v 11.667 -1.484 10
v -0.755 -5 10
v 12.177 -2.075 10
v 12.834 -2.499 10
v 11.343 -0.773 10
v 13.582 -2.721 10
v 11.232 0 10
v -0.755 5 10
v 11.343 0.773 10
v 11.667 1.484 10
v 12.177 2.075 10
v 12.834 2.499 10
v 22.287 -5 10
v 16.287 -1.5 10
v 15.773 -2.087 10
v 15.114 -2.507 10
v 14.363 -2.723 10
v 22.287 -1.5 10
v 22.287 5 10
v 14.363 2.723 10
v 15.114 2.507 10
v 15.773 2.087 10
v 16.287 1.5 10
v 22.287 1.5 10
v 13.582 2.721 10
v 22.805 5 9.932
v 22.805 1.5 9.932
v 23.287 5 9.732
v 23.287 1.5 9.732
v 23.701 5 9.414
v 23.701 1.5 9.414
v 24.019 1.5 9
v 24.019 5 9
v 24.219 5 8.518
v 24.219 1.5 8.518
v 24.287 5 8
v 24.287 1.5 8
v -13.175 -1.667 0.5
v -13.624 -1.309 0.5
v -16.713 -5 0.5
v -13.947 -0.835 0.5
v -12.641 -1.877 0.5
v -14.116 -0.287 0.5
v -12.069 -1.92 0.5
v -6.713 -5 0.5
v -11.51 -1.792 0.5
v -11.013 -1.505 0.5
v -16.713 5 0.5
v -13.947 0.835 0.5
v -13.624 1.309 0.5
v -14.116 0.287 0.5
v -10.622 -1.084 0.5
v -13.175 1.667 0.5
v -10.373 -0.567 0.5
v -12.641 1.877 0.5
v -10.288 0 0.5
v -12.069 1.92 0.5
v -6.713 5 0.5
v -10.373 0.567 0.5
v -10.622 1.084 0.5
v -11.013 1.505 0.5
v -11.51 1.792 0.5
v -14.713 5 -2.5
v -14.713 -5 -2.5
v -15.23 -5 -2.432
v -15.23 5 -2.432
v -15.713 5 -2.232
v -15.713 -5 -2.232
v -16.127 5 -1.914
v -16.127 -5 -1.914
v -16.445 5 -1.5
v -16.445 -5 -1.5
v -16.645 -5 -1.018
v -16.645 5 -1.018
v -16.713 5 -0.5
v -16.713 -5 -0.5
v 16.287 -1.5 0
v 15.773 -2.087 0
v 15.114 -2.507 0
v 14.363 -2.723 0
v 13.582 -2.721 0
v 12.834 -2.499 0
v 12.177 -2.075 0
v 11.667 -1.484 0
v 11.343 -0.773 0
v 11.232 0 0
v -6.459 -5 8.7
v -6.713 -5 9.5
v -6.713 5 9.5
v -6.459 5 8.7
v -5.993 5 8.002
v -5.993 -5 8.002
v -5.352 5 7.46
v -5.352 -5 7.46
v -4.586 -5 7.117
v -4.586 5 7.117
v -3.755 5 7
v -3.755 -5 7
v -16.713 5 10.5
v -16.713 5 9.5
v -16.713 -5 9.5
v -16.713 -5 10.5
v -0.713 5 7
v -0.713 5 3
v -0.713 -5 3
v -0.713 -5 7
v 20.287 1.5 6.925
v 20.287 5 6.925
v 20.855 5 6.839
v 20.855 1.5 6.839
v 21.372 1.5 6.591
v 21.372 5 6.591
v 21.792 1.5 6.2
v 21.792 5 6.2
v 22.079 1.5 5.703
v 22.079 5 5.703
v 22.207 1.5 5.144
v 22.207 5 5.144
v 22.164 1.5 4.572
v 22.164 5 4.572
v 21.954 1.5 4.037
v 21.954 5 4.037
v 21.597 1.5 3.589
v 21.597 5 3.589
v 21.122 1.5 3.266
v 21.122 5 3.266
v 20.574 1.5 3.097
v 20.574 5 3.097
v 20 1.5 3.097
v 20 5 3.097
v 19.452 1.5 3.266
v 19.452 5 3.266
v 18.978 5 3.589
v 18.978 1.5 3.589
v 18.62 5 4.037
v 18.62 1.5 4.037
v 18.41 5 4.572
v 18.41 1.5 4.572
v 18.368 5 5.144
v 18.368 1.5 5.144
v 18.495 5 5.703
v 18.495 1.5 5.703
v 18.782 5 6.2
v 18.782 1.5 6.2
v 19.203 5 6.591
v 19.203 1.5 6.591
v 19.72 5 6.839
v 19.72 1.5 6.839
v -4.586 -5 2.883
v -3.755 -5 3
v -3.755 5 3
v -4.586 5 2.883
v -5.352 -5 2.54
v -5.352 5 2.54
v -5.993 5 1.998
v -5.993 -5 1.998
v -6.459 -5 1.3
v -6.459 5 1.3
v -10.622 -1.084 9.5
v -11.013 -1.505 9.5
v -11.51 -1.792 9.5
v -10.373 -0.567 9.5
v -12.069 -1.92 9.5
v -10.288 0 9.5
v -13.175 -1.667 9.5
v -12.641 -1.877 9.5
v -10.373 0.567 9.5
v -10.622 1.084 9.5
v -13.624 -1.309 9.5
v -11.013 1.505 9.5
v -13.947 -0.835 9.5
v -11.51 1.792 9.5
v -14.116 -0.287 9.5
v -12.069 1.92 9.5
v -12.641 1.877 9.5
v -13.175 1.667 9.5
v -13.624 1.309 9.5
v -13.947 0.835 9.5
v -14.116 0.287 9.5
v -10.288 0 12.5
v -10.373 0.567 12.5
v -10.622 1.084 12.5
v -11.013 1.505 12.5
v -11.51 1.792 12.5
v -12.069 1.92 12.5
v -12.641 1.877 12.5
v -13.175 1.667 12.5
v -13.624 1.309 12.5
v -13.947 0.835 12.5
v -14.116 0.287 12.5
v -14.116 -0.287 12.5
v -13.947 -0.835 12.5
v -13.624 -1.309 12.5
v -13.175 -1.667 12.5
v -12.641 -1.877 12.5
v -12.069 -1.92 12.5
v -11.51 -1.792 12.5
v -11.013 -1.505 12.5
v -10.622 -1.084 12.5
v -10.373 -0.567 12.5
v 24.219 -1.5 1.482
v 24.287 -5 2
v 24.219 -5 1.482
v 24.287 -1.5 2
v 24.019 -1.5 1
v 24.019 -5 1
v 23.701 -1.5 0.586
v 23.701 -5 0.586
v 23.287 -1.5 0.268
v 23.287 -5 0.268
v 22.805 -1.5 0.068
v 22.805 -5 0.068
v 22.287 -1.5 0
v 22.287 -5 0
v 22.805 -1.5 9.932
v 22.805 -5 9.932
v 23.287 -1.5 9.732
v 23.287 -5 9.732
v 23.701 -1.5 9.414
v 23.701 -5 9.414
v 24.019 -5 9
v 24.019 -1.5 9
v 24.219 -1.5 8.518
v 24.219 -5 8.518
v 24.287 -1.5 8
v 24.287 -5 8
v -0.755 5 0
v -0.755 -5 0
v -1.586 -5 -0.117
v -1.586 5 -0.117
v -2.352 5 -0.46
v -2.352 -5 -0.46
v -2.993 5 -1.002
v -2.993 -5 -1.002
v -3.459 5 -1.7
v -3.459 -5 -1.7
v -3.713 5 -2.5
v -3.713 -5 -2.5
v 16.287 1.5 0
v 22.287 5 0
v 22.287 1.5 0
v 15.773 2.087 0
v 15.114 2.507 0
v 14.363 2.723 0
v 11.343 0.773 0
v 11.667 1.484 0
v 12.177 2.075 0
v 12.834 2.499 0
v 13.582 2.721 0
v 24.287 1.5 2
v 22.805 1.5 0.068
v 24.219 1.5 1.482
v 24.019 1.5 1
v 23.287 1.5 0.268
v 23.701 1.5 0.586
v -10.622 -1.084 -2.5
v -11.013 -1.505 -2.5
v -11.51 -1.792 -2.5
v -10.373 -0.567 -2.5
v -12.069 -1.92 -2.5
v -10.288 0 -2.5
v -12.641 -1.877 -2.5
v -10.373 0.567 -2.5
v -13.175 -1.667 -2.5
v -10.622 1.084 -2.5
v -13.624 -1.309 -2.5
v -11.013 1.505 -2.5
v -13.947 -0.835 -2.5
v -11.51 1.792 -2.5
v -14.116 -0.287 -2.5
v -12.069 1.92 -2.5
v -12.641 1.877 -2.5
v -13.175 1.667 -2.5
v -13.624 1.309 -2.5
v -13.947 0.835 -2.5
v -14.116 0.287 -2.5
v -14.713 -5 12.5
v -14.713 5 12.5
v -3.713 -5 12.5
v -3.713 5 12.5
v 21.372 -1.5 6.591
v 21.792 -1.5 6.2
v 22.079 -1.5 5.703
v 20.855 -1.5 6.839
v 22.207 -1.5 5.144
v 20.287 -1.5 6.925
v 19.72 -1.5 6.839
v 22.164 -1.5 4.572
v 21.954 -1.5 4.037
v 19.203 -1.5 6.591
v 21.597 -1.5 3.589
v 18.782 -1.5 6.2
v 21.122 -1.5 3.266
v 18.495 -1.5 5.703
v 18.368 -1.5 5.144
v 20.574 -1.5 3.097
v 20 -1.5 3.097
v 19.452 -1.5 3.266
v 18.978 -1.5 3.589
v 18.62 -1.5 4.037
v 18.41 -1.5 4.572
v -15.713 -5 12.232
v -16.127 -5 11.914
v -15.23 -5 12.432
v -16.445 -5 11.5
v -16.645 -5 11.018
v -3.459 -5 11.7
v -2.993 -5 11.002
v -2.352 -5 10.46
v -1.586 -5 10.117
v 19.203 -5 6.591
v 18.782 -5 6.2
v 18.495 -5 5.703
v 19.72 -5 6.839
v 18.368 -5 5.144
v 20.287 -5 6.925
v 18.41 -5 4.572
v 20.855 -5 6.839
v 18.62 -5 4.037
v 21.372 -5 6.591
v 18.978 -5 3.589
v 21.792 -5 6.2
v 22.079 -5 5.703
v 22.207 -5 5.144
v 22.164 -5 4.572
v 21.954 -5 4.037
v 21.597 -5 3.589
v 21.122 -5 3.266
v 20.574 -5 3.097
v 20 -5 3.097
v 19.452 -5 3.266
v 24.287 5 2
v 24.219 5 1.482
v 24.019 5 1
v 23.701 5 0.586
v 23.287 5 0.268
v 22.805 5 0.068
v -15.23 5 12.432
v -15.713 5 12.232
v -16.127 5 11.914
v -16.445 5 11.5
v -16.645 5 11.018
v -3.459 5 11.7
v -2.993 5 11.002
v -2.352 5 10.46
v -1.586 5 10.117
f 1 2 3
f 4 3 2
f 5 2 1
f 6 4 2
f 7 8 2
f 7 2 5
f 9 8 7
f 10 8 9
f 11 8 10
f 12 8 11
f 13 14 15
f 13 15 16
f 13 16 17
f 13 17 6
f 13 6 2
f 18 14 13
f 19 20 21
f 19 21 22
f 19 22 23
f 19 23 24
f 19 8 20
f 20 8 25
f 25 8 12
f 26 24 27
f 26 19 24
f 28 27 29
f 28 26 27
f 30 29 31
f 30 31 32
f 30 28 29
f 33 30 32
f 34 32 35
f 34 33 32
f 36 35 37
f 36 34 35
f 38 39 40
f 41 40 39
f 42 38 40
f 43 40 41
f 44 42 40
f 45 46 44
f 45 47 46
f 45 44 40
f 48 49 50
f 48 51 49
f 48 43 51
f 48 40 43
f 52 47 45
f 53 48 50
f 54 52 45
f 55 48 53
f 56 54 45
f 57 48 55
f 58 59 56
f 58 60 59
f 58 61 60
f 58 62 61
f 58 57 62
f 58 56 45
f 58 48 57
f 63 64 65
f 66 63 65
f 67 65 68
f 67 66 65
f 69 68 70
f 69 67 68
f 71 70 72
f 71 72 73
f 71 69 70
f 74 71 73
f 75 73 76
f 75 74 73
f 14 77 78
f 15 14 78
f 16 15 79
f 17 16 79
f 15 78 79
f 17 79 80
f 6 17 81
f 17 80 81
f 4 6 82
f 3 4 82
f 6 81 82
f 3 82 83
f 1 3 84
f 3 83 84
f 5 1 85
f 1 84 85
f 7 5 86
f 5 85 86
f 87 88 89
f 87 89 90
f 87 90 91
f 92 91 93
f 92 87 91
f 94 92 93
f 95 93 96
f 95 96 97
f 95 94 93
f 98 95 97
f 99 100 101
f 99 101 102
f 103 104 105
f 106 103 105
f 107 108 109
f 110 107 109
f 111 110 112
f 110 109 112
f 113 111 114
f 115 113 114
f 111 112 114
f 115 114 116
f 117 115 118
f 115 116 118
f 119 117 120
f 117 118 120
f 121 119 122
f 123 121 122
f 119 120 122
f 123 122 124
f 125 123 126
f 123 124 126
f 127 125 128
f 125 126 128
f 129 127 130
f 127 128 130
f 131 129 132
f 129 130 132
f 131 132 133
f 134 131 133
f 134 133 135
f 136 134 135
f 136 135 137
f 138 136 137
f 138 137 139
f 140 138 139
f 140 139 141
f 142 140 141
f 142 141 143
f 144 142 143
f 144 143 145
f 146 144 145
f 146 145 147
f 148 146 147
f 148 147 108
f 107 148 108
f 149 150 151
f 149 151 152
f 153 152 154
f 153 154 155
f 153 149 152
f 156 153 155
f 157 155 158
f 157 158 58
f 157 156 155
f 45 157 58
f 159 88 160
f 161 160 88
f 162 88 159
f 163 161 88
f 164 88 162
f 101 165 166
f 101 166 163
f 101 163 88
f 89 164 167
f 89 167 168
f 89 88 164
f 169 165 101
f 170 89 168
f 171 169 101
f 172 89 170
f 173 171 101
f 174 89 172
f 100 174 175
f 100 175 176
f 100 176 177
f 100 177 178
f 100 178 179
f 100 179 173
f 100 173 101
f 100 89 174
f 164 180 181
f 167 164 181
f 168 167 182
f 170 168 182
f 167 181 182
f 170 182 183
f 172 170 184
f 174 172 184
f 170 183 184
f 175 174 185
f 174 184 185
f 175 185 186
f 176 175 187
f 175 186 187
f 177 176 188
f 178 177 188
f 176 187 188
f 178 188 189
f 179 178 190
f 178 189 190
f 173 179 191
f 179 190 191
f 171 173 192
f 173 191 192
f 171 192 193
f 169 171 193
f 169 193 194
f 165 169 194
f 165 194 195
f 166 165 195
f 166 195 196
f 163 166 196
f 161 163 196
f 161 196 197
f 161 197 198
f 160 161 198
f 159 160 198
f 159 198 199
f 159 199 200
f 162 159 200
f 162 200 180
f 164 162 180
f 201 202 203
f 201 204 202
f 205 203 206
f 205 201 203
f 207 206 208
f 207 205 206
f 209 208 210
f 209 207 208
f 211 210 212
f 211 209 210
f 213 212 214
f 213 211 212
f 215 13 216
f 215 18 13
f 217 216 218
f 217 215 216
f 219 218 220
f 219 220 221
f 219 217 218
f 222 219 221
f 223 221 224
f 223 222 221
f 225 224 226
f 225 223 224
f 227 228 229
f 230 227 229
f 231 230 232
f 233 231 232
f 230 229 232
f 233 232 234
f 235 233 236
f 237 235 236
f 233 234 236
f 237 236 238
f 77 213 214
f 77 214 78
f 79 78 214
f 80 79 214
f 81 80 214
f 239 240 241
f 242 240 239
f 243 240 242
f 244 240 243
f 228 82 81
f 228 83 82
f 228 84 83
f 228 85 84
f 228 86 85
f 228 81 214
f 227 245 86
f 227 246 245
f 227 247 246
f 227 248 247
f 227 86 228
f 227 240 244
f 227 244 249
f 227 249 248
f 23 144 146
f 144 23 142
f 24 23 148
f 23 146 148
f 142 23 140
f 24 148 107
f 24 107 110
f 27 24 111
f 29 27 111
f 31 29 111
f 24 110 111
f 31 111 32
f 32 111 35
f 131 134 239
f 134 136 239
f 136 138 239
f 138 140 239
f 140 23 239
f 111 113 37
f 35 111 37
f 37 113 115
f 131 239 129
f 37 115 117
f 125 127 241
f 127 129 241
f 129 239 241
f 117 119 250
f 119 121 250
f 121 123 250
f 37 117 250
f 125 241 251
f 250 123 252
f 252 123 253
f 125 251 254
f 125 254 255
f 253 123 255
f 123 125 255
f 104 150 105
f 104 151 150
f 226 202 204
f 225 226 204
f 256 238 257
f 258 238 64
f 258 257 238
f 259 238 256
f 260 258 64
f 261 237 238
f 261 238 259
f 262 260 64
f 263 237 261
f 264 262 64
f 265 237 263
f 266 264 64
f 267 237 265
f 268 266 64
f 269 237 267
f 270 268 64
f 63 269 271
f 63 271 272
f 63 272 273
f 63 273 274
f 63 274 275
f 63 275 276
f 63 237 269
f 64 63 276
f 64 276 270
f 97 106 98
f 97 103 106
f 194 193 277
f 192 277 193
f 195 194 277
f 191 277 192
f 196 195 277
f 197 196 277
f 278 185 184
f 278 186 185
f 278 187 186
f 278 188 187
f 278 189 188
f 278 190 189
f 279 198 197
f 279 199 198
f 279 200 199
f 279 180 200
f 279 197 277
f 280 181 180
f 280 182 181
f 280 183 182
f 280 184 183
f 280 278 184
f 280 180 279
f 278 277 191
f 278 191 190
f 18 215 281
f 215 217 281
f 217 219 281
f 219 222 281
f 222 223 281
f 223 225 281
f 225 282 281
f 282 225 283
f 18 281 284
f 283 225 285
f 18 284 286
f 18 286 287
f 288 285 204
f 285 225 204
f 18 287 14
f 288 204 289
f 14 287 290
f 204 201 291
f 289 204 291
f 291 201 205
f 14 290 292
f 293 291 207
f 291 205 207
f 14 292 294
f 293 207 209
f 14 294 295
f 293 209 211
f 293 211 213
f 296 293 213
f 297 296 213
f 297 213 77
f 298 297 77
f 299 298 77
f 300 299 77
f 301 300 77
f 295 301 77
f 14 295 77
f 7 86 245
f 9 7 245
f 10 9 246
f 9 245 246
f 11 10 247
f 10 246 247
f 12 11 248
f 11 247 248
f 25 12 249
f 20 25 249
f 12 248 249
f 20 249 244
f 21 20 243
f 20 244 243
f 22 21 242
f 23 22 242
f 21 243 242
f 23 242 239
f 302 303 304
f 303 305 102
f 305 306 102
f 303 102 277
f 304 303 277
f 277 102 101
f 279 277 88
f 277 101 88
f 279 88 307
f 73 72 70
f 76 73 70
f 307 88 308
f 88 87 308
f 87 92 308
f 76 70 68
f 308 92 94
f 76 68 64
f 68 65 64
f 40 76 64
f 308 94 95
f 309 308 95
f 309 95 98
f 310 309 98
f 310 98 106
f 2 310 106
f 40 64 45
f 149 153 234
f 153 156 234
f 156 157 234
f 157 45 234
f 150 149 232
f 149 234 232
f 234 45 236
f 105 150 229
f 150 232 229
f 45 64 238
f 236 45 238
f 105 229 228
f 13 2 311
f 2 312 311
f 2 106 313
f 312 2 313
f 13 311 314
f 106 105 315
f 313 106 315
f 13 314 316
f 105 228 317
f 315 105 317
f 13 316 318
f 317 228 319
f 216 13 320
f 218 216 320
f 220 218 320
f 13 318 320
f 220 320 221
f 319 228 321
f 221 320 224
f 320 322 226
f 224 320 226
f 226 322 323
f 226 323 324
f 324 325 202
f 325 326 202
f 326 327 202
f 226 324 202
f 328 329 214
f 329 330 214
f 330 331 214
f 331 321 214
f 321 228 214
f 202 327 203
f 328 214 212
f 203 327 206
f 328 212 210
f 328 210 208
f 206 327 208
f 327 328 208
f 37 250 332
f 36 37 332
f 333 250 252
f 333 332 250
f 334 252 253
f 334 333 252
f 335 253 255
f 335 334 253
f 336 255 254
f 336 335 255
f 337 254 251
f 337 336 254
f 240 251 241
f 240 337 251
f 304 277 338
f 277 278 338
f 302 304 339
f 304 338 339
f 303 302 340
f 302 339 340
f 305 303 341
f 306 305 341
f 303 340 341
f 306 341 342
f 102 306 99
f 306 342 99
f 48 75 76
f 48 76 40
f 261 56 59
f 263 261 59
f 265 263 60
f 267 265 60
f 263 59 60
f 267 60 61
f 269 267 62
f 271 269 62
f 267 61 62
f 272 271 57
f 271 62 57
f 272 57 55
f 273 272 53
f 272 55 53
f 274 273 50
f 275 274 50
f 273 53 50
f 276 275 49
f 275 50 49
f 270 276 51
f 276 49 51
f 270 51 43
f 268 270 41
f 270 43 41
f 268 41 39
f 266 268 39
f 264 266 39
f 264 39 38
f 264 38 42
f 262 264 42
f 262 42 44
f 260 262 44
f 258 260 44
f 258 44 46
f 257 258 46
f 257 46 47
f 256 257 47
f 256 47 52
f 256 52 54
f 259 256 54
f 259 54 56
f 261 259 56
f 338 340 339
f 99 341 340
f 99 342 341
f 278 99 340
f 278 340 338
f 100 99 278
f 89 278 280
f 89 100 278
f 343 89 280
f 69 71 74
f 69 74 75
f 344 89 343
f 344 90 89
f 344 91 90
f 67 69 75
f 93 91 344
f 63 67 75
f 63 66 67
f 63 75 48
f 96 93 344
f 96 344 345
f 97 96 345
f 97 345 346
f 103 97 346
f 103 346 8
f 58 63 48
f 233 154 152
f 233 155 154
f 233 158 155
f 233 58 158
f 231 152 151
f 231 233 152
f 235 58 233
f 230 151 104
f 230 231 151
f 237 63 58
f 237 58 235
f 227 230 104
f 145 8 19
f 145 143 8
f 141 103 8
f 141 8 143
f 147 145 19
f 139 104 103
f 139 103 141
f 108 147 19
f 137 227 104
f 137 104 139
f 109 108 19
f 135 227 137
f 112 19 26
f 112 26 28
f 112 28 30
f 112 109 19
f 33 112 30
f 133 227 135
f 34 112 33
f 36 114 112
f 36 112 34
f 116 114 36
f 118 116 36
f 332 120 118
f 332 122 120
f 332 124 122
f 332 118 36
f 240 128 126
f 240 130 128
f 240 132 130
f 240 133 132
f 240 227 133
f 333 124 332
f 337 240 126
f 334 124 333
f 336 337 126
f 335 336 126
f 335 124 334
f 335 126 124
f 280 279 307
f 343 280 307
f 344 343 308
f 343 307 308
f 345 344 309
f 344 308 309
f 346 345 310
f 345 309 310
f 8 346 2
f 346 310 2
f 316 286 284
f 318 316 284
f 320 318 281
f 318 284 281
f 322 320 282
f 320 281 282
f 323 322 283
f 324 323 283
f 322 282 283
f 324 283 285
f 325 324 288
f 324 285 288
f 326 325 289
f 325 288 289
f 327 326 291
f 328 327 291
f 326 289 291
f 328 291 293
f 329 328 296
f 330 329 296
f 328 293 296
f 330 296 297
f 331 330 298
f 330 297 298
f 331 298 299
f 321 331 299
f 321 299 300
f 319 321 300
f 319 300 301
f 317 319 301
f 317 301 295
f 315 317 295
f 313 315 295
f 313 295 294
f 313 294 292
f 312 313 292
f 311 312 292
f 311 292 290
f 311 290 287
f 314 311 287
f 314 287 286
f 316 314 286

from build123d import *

# Parameters (mm, degrees)
BOSS_EXTRUDE1_DEPTH             = 10
SKETCH2_R                       = 1.925
CUT_EXTRUDE1_DEPTH              = 29.104589728
BOSS_EXTRUDE2_REACH             = 28.737
BOSS_EXTRUDE2_DIRECTION_2_REACH = 28.737
SKETCH4_R                       = 1.925
CUT_EXTRUDE2_DEPTH              = 29.980475562
FILLET1_START                   = -6
FILLET1_DEPTH                   = 12
FILLET1_START_2                 = -5
FILLET1_2_DEPTH                 = 10
FILLET2_R                       = 2


with BuildPart() as part:
    # Sketch1 → Boss-Extrude1 (new body)
    with BuildSketch(Plane.XY):
        with BuildLine():
            Line((-0.712802471, 5), (-0.712802471, 0))
            Line((-0.712802471, 0), (11.232311414, 0))
            ThreePointArc((11.232311414, 0), (13.199986934, 2.636374102), (16.287197529, 1.5))
            Line((16.287197529, 1.5), (24.287197529, 1.5))
            Line((24.287197529, 1.5), (24.287197529, 5))
            Line((24.287197529, 5), (-0.712802471, 5))
        make_face()
        with BuildLine():
            Line((11.232311414, 0), (-0.712802471, 0))
            Line((-0.712802471, 0), (-0.712802471, -5))
            Line((-0.712802471, -5), (24.287197529, -5))
            Line((24.287197529, -5), (24.287197529, -1.5))
            Line((24.287197529, -1.5), (16.287197529, -1.5))
            ThreePointArc((16.287197529, -1.5), (13.199986934, -2.636374102), (11.232311414, 0))
        make_face()
    extrude(amount=BOSS_EXTRUDE1_DEPTH)

    # Sketch2 → Cut-Extrude1 (cut, through all)
    with BuildSketch(Plane(origin=(0, 5, 0), x_dir=(1, 0, 0), z_dir=(0, 1, 0))):
        with Locations(Location((20.287197529, -5, 0), (0, 0, 270))):
            Circle(SKETCH2_R)
    extrude(amount=-CUT_EXTRUDE1_DEPTH, mode=Mode.SUBTRACT)

    # Boss-Extrude2: up to this face of the body (flat: up to its plane)
    boss_extrude2_end = Plane(part.part.faces().sort_by_distance((11.372052598, 5, 5))[0])
    # Sketch3 → Boss-Extrude2 (add, up to the picked face)
    with BuildSketch(Plane(origin=(0, 0, 0), x_dir=(1, 0, 0), z_dir=(0, 1, 0)), mode=Mode.PRIVATE) as boss_extrude2_sk1:
        Polygon((-0.712802471, 0), (-3.712802471, 0), (-3.712802471, 2.5), (-16.712802471, 2.5), (-16.712802471, -0.5), (-6.712802471, -0.5), (-6.712802471, -3), (-0.712802471, -3), align=None)
    boss_extrude2_tool1 = split(extrude(boss_extrude2_sk1.sketch, amount=BOSS_EXTRUDE2_REACH, mode=Mode.PRIVATE), bisect_by=boss_extrude2_end, keep=Keep.BOTH, mode=Mode.PRIVATE)
    # Sketch3 → Boss-Extrude2 (add, up to the picked face)
    with BuildSketch(Plane(origin=(0, 0, 0), x_dir=(1, 0, 0), z_dir=(0, 1, 0)), mode=Mode.PRIVATE) as boss_extrude2_sk2:
        Polygon((-0.712802471, -7), (-6.712802471, -7), (-6.712802471, -9.5), (-16.712802471, -9.5), (-16.712802471, -12.5), (-3.712802471, -12.5), (-3.712802471, -10), (-0.712802471, -10), align=None)
    boss_extrude2_tool2 = split(extrude(boss_extrude2_sk2.sketch, amount=BOSS_EXTRUDE2_REACH, mode=Mode.PRIVATE), bisect_by=boss_extrude2_end, keep=Keep.BOTH, mode=Mode.PRIVATE)
    add(boss_extrude2_tool1.solids().sort_by(Axis((-8.239829, 0, -0.222973), (0, 1, 0)))[0])
    add(boss_extrude2_tool2.solids().sort_by(Axis((-8.239829, 0, 10.222973), (0, 1, 0)))[0])

    # Boss-Extrude2 direction 2: up to this face of the body (flat: up to its plane)
    boss_extrude2_direction_2_end = Plane(part.part.faces().sort_by_distance((11.372052598, -5, 5))[0])
    # Sketch3 → Boss-Extrude2 direction 2 (add, up to the picked face)
    with BuildSketch(Plane(origin=(0, 0, 0), x_dir=(1, 0, 0), z_dir=(0, 1, 0)), mode=Mode.PRIVATE) as boss_extrude2_direction_2_sk1:
        Polygon((-0.712802471, 0), (-3.712802471, 0), (-3.712802471, 2.5), (-16.712802471, 2.5), (-16.712802471, -0.5), (-6.712802471, -0.5), (-6.712802471, -3), (-0.712802471, -3), align=None)
    boss_extrude2_direction_2_tool1 = split(extrude(boss_extrude2_direction_2_sk1.sketch, amount=-BOSS_EXTRUDE2_DIRECTION_2_REACH, mode=Mode.PRIVATE), bisect_by=boss_extrude2_direction_2_end, keep=Keep.BOTH, mode=Mode.PRIVATE)
    # Sketch3 → Boss-Extrude2 direction 2 (add, up to the picked face)
    with BuildSketch(Plane(origin=(0, 0, 0), x_dir=(1, 0, 0), z_dir=(0, 1, 0)), mode=Mode.PRIVATE) as boss_extrude2_direction_2_sk2:
        Polygon((-0.712802471, -7), (-6.712802471, -7), (-6.712802471, -9.5), (-16.712802471, -9.5), (-16.712802471, -12.5), (-3.712802471, -12.5), (-3.712802471, -10), (-0.712802471, -10), align=None)
    boss_extrude2_direction_2_tool2 = split(extrude(boss_extrude2_direction_2_sk2.sketch, amount=-BOSS_EXTRUDE2_DIRECTION_2_REACH, mode=Mode.PRIVATE), bisect_by=boss_extrude2_direction_2_end, keep=Keep.BOTH, mode=Mode.PRIVATE)
    add(boss_extrude2_direction_2_tool1.solids().sort_by(Axis((-8.239829, 0, -0.222973), (0, -1, 0)))[0])
    add(boss_extrude2_direction_2_tool2.solids().sort_by(Axis((-8.239829, 0, 10.222973), (0, -1, 0)))[0])

    # Sketch4 → Cut-Extrude2 (cut, through all)
    with BuildSketch(Plane.XY.offset(12.5)):
        with Locations((-12.212802471, 0)):
            Circle(SKETCH4_R)
    extrude(amount=-CUT_EXTRUDE2_DEPTH, mode=Mode.SUBTRACT)

    # Fillet1: read off the stored shape, not the designer's step
    # Fillet1 outline → Fillet1 (cut)
    with BuildSketch(Plane(origin=(0, 0, 0), x_dir=(1, 0, 0), z_dir=(0, 1, 0)).offset(FILLET1_START)):
        with BuildLine():
            Line((-6.712802471, -7), (-6.712802471, -9.5))
            ThreePointArc((-6.712802471, -9.5), (-5.691254253, -7.708712153), (-3.75476258, -7))
            Line((-3.75476258, -7), (-6.712802471, -7))
        make_face()
        with BuildLine():
            ThreePointArc((-3.75476258, -3), (-5.691254253, -2.291287847), (-6.712802471, -0.5))
            Line((-6.712802471, -0.5), (-6.712802471, -3))
            Line((-6.712802471, -3), (-3.75476258, -3))
        make_face()
    extrude(amount=FILLET1_DEPTH, mode=Mode.SUBTRACT)

    # Fillet1 2 outline → Fillet1 2 (add)
    with BuildSketch(Plane(origin=(0, 0, 0), x_dir=(1, 0, 0), z_dir=(0, 1, 0)).offset(FILLET1_START_2)):
        with BuildLine():
            Line((-3.712802471, -10), (-3.712802471, -12.5))
            ThreePointArc((-3.712802471, -12.5), (-2.691254253, -10.708712153), (-0.75476258, -10))
            Line((-0.75476258, -10), (-3.712802471, -10))
        make_face()
        with BuildLine():
            ThreePointArc((-0.75476258, 0), (-2.691254253, 0.708712153), (-3.712802471, 2.5))
            Line((-3.712802471, 2.5), (-3.712802471, 0))
            Line((-3.712802471, 0), (-0.75476258, 0))
        make_face()
    extrude(amount=FILLET1_2_DEPTH)

    # Fillet2
    fillet2_edges = [part.edges().sort_by_distance(p)[0] for p in [
        (24.287197529, 3.25, 0),
        (24.287197529, -3.25, 0),
        (24.287197529, -3.25, 10),
        (24.287197529, 3.25, 10),
        (-16.712802471, 0, -2.5),
        (-16.712802471, 0, 12.5),
    ]]
    fillet(fillet2_edges, radius=FILLET2_R)


solid = part.part
